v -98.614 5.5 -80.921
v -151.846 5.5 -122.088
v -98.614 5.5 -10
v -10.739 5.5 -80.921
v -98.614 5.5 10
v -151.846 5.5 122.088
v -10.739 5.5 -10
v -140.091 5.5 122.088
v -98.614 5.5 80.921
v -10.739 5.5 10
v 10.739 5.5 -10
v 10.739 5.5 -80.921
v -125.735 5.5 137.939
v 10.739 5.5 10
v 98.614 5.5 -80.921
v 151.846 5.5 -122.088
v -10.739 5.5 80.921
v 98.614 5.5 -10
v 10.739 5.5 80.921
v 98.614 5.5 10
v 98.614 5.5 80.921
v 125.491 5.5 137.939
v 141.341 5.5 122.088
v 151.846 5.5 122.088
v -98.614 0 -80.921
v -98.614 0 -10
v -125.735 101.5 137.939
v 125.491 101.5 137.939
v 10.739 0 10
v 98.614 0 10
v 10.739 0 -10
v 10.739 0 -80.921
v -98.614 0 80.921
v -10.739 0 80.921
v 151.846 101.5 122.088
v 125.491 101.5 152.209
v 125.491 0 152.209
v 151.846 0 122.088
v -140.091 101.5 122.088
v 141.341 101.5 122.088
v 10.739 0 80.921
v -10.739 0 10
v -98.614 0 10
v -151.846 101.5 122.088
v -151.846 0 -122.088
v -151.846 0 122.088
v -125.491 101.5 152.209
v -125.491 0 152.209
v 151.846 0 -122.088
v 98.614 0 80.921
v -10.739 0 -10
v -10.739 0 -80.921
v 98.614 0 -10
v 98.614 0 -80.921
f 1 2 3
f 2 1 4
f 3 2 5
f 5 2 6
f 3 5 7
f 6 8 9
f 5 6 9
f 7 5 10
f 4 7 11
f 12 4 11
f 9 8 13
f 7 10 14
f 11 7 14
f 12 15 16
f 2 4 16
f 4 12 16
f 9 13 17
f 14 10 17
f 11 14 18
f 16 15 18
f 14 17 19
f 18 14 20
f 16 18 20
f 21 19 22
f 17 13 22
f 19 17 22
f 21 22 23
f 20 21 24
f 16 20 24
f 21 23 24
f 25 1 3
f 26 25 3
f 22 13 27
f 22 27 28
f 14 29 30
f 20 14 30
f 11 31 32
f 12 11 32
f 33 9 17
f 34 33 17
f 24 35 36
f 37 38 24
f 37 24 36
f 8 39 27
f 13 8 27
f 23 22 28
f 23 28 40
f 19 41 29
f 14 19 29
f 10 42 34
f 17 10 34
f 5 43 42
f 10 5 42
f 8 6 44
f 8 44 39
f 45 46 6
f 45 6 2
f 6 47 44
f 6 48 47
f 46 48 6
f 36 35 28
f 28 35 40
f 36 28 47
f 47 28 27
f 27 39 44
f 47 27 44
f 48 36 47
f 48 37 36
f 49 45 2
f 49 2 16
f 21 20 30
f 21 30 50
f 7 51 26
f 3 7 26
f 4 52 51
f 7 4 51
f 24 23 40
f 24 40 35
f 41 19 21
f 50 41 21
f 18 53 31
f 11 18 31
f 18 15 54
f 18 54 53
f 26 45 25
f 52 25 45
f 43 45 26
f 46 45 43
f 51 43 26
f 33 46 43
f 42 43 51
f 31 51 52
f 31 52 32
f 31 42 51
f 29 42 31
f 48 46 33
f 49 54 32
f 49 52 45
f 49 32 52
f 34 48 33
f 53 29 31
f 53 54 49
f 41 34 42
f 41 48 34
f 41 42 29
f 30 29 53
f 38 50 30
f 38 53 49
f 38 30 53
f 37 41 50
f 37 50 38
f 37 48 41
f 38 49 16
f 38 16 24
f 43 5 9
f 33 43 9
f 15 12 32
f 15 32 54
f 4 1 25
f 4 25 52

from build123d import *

# Parameters (mm, degrees)
BOSS_EXTRU_1_DEPTH           = 5.5
BOSS_EXTRU_2_DEPTH           = 96
ENL_V_MAT_EXTRU_1_DEPTH      = 39
ENL_V_MAT_EXTRU_1_DEPTH_BACK = 37
ESQUISSE3_W                  = 197.227924694
ESQUISSE3_H                  = 161.841973662
BOSS_EXTRU_3_DEPTH           = 5.5


with BuildPart() as part:
    # Esquisse1 → Boss.-Extru.1 (new body)
    with BuildSketch(Plane(origin=(0, 0, 0), x_dir=(-1, 0, 0), z_dir=(0, 1, 0))):
        Polygon((-151.846153846, 122.087912088), (-125.490601914, 152.208542868), (125.490601914, 152.208542868), (151.846153846, 122.087912088), (151.846153846, -122.087912088), (-151.846153846, -122.087912088), align=None)
    extrude(amount=BOSS_EXTRU_1_DEPTH)

    # Esquisse2 → Boss.-Extru.2 (add)
    with BuildSketch(Plane(origin=(0, 5.5, 0), x_dir=(1, 0, 0), z_dir=(0, 1, 0))):
        Polygon((-151.846153846, -122.087912088), (-140.09050176, -122.087912088), (-125.734949828, -137.938542868), (125.490601914, -137.938542868), (141.341232694, -122.087912088), (151.846153846, -122.087912088), (125.490601914, -152.208542868), (-125.490601914, -152.208542868), align=None)
    extrude(amount=BOSS_EXTRU_2_DEPTH)

    # Esquisse3 → Enlèv. mat.-Extru.1 (cut, two sides: drawn at the far end of the back side and taken through both)
    with BuildSketch(Plane.XZ.offset(-ENL_V_MAT_EXTRU_1_DEPTH_BACK)):
        Rectangle(ESQUISSE3_W, ESQUISSE3_H)
    extrude(amount=ENL_V_MAT_EXTRU_1_DEPTH + ENL_V_MAT_EXTRU_1_DEPTH_BACK, mode=Mode.SUBTRACT)

    # Esquisse4 → Boss.-Extru.3 (add)
    with BuildSketch(Plane.XZ):
        Polygon((-10.738571279, 80.920986831), (10.738571279, 80.920986831), (10.738571279, 10), (98.613962347, 10), (98.613962347, -10), (10.738571279, -10), (10.738571279, -80.920986831), (-10.738571279, -80.920986831), (-10.738571279, -10), (-98.613962347, -10), (-98.613962347, 10), (-10.738571279, 10), align=None)
    extrude(amount=-BOSS_EXTRU_3_DEPTH)


solid = part.part
